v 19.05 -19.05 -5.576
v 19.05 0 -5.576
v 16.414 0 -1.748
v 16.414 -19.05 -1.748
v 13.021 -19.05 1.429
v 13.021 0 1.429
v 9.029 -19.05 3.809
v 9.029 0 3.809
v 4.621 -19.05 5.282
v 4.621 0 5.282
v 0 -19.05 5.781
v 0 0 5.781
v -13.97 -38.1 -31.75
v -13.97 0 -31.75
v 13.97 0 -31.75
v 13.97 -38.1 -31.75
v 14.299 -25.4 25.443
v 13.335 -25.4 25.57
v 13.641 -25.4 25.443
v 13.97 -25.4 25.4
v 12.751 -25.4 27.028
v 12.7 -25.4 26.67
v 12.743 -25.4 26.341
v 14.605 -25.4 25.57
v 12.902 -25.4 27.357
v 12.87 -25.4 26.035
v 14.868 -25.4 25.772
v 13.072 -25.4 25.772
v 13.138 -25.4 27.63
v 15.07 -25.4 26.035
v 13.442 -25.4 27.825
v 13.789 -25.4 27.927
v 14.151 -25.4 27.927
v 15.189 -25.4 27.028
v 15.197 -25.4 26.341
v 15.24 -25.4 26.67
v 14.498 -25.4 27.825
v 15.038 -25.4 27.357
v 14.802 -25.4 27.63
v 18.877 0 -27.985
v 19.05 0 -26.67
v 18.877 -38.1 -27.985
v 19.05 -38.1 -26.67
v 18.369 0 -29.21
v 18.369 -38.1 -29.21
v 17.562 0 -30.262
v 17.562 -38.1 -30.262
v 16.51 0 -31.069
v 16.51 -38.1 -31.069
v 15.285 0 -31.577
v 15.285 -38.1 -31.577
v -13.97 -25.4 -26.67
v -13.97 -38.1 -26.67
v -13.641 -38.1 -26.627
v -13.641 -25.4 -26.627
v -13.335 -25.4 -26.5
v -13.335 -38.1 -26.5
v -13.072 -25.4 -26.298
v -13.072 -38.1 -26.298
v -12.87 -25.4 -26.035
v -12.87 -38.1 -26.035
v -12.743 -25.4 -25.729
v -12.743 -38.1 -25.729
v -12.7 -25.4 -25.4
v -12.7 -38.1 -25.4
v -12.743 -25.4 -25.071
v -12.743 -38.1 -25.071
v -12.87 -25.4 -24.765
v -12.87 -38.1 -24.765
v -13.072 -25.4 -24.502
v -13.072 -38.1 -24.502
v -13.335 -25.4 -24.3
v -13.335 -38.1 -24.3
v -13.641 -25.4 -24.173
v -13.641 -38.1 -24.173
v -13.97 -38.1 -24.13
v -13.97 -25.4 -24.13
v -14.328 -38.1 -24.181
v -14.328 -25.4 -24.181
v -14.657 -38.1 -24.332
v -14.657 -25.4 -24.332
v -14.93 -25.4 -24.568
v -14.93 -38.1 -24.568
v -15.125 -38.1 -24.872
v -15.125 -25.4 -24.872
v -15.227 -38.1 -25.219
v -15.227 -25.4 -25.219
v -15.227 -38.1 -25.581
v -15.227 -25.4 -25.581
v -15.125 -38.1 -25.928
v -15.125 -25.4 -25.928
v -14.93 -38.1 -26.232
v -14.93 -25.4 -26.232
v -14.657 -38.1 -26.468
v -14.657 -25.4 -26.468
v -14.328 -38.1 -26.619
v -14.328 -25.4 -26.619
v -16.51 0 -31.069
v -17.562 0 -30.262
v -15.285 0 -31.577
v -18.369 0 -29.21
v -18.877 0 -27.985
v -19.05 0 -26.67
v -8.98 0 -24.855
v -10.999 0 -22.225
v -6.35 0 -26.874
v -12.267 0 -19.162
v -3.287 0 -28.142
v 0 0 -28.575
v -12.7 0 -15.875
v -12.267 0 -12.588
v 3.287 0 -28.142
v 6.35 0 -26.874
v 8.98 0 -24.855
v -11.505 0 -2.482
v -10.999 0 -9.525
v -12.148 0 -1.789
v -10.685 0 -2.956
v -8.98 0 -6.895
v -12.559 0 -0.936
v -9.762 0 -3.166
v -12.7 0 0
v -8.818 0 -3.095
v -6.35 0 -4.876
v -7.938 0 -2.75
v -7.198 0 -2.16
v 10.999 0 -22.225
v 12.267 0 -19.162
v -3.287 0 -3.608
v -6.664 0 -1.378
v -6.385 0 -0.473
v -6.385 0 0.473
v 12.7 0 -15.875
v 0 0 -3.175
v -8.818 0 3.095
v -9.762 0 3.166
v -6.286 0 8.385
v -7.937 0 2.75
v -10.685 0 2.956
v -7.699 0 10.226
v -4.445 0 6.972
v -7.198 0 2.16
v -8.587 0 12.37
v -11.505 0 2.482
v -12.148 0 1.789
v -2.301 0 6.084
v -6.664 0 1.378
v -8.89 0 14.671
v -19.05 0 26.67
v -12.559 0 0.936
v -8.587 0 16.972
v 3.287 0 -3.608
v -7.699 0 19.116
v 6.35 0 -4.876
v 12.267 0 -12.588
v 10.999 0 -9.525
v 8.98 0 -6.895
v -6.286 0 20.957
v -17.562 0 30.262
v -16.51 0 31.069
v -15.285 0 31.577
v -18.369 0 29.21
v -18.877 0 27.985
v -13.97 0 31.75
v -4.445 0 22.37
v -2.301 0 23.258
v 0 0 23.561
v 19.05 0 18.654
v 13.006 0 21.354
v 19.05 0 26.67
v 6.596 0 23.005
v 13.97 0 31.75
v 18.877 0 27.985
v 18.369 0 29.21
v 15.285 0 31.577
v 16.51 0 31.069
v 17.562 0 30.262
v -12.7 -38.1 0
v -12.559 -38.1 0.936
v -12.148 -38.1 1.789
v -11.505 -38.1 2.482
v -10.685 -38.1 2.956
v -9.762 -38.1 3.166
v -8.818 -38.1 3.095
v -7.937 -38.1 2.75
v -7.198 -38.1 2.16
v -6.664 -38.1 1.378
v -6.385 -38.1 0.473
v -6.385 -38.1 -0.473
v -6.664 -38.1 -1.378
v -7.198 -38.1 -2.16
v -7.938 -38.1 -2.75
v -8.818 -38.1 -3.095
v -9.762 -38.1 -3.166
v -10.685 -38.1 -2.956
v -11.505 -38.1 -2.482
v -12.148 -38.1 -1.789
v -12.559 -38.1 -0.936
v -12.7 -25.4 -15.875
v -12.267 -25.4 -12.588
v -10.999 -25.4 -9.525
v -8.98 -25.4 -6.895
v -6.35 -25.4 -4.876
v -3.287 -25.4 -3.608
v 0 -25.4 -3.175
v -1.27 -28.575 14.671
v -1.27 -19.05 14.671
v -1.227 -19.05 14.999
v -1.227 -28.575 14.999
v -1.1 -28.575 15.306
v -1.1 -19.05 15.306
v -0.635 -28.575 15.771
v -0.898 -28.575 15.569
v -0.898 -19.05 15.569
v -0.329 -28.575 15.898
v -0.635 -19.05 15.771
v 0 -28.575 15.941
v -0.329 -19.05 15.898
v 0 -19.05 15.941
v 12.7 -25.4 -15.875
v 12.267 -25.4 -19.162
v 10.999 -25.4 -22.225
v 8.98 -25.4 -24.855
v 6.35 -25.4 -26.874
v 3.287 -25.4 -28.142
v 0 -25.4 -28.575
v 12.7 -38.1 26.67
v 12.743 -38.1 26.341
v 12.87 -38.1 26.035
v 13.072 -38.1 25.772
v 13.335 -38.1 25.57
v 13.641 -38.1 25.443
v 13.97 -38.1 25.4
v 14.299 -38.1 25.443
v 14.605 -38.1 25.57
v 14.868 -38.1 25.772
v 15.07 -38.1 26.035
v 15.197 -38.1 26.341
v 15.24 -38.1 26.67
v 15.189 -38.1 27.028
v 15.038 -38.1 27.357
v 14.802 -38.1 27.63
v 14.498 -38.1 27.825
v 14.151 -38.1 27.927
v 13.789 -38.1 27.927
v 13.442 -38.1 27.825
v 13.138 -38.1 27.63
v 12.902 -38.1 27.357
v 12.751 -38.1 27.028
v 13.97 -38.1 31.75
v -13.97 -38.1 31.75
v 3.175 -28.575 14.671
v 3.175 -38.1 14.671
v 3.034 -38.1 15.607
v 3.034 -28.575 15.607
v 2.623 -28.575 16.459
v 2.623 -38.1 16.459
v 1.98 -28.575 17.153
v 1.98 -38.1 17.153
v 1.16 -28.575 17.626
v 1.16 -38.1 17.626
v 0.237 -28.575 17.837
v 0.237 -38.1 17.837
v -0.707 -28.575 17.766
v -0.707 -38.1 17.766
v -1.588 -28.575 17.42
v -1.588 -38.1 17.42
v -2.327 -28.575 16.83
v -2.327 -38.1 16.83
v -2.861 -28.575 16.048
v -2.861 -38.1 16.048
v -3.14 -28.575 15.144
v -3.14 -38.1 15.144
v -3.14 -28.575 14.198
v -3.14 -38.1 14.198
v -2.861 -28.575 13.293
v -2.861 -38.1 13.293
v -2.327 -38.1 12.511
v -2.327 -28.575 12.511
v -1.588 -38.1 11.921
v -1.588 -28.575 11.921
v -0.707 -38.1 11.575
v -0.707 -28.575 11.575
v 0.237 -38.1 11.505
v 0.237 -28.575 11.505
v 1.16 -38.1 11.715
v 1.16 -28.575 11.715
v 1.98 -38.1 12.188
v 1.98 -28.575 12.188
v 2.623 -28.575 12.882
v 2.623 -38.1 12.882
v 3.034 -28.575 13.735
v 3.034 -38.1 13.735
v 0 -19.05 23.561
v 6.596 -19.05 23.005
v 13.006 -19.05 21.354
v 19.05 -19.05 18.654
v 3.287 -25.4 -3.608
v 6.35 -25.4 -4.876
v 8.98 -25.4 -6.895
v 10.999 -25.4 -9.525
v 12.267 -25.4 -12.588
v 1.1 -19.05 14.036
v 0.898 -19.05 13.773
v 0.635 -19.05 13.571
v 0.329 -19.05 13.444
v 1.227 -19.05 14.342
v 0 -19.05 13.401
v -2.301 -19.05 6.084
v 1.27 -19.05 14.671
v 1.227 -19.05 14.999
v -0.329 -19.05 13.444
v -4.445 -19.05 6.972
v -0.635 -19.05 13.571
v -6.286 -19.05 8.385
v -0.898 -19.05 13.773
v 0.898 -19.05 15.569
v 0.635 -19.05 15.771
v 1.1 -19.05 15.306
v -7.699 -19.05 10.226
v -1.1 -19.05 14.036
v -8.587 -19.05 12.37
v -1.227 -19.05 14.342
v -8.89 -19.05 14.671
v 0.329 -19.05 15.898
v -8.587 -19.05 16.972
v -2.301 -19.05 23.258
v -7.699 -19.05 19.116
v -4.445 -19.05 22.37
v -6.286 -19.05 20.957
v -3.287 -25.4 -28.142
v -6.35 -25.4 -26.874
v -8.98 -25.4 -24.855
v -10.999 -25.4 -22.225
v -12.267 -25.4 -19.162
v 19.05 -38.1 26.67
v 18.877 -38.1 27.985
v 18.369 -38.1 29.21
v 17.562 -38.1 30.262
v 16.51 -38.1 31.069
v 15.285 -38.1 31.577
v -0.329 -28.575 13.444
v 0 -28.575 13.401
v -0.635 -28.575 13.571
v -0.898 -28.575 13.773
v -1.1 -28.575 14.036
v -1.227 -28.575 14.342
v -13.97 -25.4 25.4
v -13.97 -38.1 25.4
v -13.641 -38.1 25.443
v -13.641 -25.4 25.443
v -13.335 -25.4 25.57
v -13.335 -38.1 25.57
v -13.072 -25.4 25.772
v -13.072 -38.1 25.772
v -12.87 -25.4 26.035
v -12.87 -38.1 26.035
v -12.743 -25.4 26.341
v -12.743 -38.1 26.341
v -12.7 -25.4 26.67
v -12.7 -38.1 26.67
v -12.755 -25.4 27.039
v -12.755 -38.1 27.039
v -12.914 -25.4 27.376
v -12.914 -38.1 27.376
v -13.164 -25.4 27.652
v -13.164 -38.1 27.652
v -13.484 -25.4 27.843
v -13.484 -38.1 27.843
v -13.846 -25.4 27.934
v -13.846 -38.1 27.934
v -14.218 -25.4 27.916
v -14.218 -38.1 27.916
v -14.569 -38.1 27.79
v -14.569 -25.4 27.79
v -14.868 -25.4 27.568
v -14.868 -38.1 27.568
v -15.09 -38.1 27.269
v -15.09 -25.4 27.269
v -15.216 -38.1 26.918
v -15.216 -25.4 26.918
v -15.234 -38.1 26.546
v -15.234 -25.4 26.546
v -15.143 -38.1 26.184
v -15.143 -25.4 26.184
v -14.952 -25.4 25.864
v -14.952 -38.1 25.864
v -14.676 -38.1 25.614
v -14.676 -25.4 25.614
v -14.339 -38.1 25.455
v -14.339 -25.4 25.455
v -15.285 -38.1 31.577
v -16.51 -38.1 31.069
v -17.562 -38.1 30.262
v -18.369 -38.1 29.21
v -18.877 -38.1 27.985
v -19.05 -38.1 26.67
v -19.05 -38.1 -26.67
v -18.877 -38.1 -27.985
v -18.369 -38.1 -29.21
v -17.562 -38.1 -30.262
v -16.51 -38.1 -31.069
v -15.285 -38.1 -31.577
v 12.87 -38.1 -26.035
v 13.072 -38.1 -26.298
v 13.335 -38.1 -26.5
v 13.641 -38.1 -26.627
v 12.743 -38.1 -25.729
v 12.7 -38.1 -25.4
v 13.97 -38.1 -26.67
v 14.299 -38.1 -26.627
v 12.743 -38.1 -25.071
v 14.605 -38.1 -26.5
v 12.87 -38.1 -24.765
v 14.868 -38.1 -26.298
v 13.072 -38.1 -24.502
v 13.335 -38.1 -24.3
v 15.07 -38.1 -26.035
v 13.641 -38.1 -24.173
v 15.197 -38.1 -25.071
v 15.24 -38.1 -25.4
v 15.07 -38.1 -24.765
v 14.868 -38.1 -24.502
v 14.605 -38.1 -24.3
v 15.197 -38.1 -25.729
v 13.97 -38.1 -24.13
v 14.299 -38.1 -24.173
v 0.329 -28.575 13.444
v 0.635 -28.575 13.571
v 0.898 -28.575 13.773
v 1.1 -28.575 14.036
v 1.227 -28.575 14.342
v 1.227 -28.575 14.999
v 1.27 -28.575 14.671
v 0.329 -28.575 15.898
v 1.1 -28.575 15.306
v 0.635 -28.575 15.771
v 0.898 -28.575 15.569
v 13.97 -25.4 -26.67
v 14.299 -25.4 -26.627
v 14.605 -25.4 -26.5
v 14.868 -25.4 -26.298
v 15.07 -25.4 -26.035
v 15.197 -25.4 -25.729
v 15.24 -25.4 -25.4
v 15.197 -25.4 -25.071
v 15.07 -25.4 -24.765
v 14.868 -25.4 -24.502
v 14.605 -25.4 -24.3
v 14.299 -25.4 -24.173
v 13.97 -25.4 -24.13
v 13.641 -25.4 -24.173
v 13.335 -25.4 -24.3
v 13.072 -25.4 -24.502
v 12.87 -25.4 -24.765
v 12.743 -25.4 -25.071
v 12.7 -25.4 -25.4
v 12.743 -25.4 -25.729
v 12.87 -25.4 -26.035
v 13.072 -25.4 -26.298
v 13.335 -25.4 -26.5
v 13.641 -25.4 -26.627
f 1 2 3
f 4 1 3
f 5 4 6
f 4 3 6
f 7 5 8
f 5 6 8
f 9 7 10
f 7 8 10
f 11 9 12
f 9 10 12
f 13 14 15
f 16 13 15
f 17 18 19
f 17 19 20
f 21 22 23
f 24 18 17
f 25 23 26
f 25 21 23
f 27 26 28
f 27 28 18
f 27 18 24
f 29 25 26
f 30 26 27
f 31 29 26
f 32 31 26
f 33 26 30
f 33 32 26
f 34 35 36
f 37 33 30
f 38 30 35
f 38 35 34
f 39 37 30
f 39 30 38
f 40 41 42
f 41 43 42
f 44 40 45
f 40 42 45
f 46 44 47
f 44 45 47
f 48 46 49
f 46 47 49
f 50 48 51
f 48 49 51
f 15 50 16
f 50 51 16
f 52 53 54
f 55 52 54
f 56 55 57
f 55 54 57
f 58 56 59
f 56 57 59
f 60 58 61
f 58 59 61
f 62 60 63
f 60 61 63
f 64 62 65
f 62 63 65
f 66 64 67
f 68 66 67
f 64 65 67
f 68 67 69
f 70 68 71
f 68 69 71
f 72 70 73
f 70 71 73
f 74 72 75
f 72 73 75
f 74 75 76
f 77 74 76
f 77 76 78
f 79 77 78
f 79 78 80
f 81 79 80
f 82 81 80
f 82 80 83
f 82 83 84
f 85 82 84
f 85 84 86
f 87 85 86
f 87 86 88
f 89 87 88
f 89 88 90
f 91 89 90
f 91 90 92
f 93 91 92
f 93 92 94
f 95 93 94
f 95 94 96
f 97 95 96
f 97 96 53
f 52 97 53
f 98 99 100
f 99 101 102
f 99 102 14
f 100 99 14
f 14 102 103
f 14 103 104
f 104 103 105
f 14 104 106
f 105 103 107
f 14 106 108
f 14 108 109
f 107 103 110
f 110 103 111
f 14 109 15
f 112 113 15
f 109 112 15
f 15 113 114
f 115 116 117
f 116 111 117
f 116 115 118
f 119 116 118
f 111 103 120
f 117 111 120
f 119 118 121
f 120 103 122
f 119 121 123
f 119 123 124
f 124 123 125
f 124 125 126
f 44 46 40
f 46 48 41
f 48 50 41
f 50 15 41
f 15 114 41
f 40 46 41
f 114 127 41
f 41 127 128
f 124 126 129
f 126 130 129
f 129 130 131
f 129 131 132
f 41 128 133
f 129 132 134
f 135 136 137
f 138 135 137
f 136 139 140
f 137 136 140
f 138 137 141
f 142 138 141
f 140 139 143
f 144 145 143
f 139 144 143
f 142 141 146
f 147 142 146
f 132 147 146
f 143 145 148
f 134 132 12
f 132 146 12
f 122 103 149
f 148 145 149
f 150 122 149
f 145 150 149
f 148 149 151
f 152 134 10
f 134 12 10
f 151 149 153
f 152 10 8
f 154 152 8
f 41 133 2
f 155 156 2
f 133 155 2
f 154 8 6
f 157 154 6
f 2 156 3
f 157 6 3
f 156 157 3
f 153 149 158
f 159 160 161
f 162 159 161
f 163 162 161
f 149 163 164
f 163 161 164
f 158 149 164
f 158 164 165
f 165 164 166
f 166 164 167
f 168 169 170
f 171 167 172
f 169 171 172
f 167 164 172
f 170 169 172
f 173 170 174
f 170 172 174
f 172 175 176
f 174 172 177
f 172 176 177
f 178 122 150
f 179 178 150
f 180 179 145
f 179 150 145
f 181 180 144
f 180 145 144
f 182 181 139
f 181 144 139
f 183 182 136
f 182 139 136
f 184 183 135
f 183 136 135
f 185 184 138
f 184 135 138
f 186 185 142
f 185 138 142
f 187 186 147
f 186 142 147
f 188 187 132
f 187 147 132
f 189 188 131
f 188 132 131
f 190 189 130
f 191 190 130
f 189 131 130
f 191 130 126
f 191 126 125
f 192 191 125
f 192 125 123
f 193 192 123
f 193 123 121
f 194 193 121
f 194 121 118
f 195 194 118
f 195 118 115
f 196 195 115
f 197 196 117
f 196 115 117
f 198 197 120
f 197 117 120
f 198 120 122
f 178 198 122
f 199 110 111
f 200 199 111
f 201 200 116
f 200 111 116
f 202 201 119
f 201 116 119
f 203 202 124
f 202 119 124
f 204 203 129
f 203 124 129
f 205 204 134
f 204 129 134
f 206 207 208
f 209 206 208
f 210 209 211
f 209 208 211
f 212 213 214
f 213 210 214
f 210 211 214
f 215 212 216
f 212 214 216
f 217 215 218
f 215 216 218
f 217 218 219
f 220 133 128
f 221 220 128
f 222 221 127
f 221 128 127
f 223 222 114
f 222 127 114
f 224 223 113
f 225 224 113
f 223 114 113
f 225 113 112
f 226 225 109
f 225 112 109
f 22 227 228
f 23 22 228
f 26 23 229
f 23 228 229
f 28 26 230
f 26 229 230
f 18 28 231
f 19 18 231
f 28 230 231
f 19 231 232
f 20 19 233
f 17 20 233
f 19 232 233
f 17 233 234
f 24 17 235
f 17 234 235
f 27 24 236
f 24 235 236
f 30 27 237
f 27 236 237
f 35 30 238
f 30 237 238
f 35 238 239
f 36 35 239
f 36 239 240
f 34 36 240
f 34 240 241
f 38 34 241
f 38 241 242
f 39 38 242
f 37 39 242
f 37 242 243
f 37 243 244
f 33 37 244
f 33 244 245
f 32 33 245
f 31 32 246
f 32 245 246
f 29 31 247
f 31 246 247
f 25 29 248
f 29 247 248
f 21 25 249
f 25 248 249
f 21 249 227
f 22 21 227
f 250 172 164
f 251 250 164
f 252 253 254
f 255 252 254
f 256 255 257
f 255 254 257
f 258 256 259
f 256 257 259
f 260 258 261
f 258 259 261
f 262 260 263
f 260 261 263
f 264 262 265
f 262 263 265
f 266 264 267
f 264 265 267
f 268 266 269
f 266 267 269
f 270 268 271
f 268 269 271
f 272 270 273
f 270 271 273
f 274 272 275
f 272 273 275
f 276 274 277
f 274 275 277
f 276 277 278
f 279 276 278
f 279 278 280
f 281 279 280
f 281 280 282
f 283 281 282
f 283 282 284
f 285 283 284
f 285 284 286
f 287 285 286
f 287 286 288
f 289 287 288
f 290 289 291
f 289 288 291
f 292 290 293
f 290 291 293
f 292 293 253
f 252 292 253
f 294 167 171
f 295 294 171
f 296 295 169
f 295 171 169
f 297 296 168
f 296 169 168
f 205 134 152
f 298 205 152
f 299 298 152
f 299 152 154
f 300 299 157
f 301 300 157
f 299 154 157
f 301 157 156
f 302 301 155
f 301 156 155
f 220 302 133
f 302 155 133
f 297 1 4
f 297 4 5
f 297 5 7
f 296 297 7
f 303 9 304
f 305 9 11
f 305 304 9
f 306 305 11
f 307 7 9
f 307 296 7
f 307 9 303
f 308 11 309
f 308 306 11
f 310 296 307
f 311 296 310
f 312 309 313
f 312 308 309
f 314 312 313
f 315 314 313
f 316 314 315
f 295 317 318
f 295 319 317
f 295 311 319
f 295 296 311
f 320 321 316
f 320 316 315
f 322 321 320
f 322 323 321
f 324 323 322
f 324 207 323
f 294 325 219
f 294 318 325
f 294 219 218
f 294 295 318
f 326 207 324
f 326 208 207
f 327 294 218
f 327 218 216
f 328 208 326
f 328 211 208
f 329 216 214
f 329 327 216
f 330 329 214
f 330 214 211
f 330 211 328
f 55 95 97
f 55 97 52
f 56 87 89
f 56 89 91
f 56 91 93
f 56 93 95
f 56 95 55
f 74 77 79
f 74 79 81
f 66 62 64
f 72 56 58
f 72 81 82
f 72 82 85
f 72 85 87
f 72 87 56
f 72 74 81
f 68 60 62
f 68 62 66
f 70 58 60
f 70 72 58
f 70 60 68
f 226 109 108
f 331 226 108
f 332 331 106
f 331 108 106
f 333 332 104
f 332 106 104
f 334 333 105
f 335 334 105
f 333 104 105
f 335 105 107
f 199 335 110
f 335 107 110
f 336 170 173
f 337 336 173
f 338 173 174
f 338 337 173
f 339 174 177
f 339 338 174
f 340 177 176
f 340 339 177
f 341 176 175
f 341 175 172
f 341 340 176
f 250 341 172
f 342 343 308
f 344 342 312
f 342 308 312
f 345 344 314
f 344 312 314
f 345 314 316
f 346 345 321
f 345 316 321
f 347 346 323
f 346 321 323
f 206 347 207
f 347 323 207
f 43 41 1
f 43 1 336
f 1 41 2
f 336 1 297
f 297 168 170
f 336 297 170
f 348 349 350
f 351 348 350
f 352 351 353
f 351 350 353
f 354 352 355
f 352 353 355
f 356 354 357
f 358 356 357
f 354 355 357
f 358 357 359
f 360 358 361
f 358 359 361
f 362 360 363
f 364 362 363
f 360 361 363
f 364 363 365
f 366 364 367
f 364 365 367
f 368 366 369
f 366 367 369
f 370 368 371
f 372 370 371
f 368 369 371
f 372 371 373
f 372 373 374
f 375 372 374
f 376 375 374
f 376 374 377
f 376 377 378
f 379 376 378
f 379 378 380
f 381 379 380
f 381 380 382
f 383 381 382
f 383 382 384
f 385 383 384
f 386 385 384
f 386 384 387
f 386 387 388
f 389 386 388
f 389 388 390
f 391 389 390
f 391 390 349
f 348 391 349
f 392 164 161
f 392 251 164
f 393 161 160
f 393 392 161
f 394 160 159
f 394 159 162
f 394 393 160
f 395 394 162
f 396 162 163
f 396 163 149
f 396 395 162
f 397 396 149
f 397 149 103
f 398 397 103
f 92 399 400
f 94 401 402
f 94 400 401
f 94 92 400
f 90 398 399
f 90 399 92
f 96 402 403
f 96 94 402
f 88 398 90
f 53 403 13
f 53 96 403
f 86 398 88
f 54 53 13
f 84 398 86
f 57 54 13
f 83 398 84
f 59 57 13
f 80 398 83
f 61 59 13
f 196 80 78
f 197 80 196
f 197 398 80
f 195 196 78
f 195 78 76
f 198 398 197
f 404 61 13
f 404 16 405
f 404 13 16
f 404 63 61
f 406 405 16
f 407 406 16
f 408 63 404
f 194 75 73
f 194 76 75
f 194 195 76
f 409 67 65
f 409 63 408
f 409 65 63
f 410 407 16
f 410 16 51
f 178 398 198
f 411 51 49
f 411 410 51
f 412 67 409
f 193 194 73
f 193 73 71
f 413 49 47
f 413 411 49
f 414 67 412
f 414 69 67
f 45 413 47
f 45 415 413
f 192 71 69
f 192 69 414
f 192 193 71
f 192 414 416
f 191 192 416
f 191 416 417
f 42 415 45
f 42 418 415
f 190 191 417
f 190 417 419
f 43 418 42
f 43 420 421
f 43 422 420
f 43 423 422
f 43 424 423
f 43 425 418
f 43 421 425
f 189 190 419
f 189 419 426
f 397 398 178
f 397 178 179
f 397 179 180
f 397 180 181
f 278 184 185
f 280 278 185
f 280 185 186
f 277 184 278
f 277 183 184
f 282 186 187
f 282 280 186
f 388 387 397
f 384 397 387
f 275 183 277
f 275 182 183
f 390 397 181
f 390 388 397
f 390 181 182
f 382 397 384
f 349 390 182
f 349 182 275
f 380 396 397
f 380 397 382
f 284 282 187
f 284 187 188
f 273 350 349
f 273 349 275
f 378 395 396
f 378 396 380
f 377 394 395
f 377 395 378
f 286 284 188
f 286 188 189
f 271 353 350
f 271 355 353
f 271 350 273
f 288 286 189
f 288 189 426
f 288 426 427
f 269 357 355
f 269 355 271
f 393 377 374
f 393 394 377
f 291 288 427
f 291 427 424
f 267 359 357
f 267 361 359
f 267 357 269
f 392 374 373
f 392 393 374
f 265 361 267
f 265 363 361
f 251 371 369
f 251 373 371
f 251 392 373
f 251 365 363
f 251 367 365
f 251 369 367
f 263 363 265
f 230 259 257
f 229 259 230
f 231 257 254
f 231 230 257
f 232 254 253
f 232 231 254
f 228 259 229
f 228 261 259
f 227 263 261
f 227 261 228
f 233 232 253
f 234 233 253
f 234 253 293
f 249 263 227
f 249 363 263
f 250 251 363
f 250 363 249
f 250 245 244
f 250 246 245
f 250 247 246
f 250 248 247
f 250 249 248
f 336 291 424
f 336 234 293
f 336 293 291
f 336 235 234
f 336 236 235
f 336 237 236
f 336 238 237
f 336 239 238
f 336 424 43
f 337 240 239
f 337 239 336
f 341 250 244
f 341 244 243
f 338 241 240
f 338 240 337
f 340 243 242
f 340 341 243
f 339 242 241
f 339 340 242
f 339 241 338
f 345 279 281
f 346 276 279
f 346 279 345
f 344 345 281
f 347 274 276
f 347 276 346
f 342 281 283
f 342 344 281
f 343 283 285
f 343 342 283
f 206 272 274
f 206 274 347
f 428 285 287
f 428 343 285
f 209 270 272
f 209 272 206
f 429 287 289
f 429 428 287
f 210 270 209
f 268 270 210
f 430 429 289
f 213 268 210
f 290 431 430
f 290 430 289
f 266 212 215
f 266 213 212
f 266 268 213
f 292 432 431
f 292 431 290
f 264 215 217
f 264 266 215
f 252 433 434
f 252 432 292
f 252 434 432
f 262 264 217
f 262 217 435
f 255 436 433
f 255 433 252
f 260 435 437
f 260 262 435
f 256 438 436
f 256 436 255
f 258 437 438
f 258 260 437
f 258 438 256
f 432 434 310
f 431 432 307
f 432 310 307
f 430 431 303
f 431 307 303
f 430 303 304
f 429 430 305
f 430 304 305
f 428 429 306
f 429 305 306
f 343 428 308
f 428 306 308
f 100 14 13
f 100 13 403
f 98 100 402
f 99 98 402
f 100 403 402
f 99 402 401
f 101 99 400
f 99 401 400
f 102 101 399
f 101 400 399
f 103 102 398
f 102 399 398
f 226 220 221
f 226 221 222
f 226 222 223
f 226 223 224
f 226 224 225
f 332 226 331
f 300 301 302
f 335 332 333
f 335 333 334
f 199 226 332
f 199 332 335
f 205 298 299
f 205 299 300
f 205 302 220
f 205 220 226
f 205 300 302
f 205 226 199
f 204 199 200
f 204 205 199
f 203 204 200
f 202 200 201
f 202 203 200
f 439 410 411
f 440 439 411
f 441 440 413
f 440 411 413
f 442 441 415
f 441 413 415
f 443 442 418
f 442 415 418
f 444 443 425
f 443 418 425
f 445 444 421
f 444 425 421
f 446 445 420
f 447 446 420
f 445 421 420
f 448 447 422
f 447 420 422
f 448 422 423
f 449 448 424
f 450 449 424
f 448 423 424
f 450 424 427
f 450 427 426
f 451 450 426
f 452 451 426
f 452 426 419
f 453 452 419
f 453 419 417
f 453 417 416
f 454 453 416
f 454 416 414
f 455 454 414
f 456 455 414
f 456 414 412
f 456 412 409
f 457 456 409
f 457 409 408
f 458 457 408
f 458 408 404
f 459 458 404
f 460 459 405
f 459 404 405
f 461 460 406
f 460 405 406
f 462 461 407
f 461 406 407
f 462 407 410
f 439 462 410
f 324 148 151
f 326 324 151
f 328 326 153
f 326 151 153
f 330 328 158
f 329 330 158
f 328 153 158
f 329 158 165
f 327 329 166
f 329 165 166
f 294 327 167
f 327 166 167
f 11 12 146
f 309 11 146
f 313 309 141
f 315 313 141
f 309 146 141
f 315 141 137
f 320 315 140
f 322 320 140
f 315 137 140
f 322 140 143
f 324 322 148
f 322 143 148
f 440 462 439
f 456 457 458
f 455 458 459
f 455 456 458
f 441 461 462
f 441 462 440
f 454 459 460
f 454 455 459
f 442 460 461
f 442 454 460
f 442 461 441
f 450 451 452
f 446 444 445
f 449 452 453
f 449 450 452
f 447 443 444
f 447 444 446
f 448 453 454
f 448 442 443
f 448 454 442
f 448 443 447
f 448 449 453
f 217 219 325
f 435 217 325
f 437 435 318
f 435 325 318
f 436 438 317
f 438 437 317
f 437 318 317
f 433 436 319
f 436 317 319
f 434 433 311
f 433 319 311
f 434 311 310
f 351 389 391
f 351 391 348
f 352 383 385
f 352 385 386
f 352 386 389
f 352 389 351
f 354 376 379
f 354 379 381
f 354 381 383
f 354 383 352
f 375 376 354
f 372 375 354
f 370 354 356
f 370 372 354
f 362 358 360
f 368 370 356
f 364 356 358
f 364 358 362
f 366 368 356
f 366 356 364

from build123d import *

# Parameters (mm, degrees)
F1_DEPTH = 38.1
F3_DEPTH = 19.05
F4_DEPTH = 38.1
F5_DEPTH = 25.4
F6_R     = 5.08
F7_R     = 3.175
F7_R_2   = 1.27
F8_DEPTH = 9.525
F9_DEPTH = 12.7
F10_R    = 5.08


# Not quite as in the source:
# - a feature names something its author has since deleted; it is built from what else it names


with BuildPart() as f1:
    # F0 (on Front) → F1 (new body)
    with BuildSketch(Plane.XZ):
        Polygon((19.05, -31.75), (19.05, 31.75), (-19.05, 31.75), (-19.05, 0), (-19.05, -31.75), align=None)
        with BuildLine():
            ThreePointArc((-6.35, 0), (-9.525, -3.175), (-12.7, 0))
            ThreePointArc((-12.7, 0), (-9.525, 3.175), (-6.35, 0))
        make_face(mode=Mode.SUBTRACT)
    extrude(amount=F1_DEPTH)

    # F2 (on face) → F3 (cut)
    with BuildSketch(Plane(origin=(0, 0, 0), x_dir=(-1, 0, 0), z_dir=(0, 1, 0))):
        with BuildLine():
            ThreePointArc((-8.89, 14.6707808959), (-6.2861792775, 20.956960188), (2.06e-08, 23.5607808959))
            ThreePointArc((2.06e-08, 23.5607808959), (-9.8358430758, 22.3144881592), (-19.05, 18.654383355))
            Line((-19.05, 18.654383355), (-19.05, 14.6707808959))
            Line((-19.05, 14.6707808959), (-8.89, 14.6707808959))
        make_face()
        with BuildLine():
            ThreePointArc((1.27, 14.6707808959), (0.8980256121, 15.5688065081), (0, 15.9407808959))
            Line((0, 15.9407808959), (0, 14.6707808959))
            Line((0, 14.6707808959), (1.27, 14.6707808959))
        make_face()
        with BuildLine():
            ThreePointArc((0, 13.4007808959), (0.8980256121, 13.7727552838), (1.27, 14.6707808959))
            Line((1.27, 14.6707808959), (0, 14.6707808959))
            Line((0, 14.6707808959), (0, 13.4007808959))
        make_face()
        with BuildLine():
            Line((0, 14.6707808959), (0, 15.9407808959))
            ThreePointArc((0, 15.9407808959), (-0.8980256121, 15.5688065081), (-1.27, 14.6707808959))
            Line((-1.27, 14.6707808959), (0, 14.6707808959))
        make_face()
        with BuildLine():
            Line((0, 14.6707808959), (-1.27, 14.6707808959))
            ThreePointArc((-1.27, 14.6707808959), (-0.8980256121, 13.7727552838), (0, 13.4007808959))
            Line((0, 13.4007808959), (0, 14.6707808959))
        make_face()
        with BuildLine():
            ThreePointArc((-1.6e-09, 5.7807808959), (-6.2861792853, 8.3846016118), (-8.89, 14.6707808959))
            Line((-8.89, 14.6707808959), (-19.05, 14.6707808959))
            Line((-19.05, 14.6707808959), (-19.05, -5.5759541115))
            ThreePointArc((-19.05, -5.5759541115), (-11.0891605869, 2.7261656541), (-1.6e-09, 5.7807808959))
        make_face()
        with BuildLine():
            Line((-1.27, 14.6707808959), (-8.89, 14.6707808959))
            ThreePointArc((-8.89, 14.6707808959), (-6.2861792853, 8.3846016118), (-1.6e-09, 5.7807808959))
            Line((0, 5.7807808959), (0, 6.7332808959))
            Line((0, 6.7332808959), (0, 13.4007808959))
            ThreePointArc((0, 13.4007808959), (-0.8980256121, 13.7727552838), (-1.27, 14.6707808959))
        make_face()
        with BuildLine():
            ThreePointArc((-1.6e-09, 5.7807808959), (6.2861792842, 8.3846016106), (8.89, 14.6707808959))
            Line((8.89, 14.6707808959), (1.27, 14.6707808959))
            ThreePointArc((1.27, 14.6707808959), (0.8980256121, 13.7727552838), (0, 13.4007808959))
            Line((0, 13.4007808959), (0, 6.7332808959))
            Line((0, 6.7332808959), (0, 5.7807808959))
        make_face()
        with BuildLine():
            ThreePointArc((8.89, 14.6707808959), (6.286179292, 20.9569601734), (2.06e-08, 23.5607808959))
            Line((0, 23.5607808959), (0, 22.6082808959))
            Line((0, 22.6082808959), (0, 15.9407808959))
            ThreePointArc((0, 15.9407808959), (0.8980256121, 15.5688065081), (1.27, 14.6707808959))
            Line((1.27, 14.6707808959), (8.89, 14.6707808959))
        make_face()
        with BuildLine():
            Line((0, 22.6082808959), (0, 23.5607808959))
            ThreePointArc((2.06e-08, 23.5607808959), (-6.2861792775, 20.956960188), (-8.89, 14.6707808959))
            Line((-8.89, 14.6707808959), (-1.27, 14.6707808959))
            ThreePointArc((-1.27, 14.6707808959), (-0.8980256121, 15.5688065081), (0, 15.9407808959))
            Line((0, 15.9407808959), (0, 22.6082808959))
        make_face()
    extrude(amount=-F3_DEPTH, mode=Mode.SUBTRACT)

    # F2 (on face) → F4 (cut)
    with BuildSketch(Plane(origin=(0, 0, 0), x_dir=(-1, 0, 0), z_dir=(0, 1, 0))):
        with BuildLine():
            Line((0, 14.6707808959), (0, 15.9407808959))
            ThreePointArc((0, 15.9407808959), (-0.8980256121, 15.5688065081), (-1.27, 14.6707808959))
            Line((-1.27, 14.6707808959), (0, 14.6707808959))
        make_face()
        with BuildLine():
            ThreePointArc((1.27, 14.6707808959), (0.8980256121, 15.5688065081), (0, 15.9407808959))
            Line((0, 15.9407808959), (0, 14.6707808959))
            Line((0, 14.6707808959), (1.27, 14.6707808959))
        make_face()
        with BuildLine():
            ThreePointArc((0, 13.4007808959), (0.8980256121, 13.7727552838), (1.27, 14.6707808959))
            Line((1.27, 14.6707808959), (0, 14.6707808959))
            Line((0, 14.6707808959), (0, 13.4007808959))
        make_face()
        with BuildLine():
            Line((0, 14.6707808959), (-1.27, 14.6707808959))
            ThreePointArc((-1.27, 14.6707808959), (-0.8980256121, 13.7727552838), (0, 13.4007808959))
            Line((0, 13.4007808959), (0, 14.6707808959))
        make_face()
    extrude(amount=-F4_DEPTH, mode=Mode.SUBTRACT)

    # F2 (on face) → F5 (cut)
    with BuildSketch(Plane(origin=(0, 0, 0), x_dir=(-1, 0, 0), z_dir=(0, 1, 0))):
        with BuildLine():
            ThreePointArc((12.7, -15.875), (8.9802561211, -6.8947438789), (0, -3.175))
            ThreePointArc((0, -3.175), (-8.9802561211, -6.8947438789), (-12.7, -15.875))
            ThreePointArc((-12.7, -15.875), (-8.9802561211, -24.8552561211), (0, -28.575))
            ThreePointArc((0, -28.575), (8.9802561211, -24.8552561211), (12.7, -15.875))
        make_face()
    extrude(amount=-F5_DEPTH, mode=Mode.SUBTRACT)

    # F6
    f6_edges = [f1.edges().sort_by_distance(p)[0] for p in [
        (19.05, -19.05, 31.75),
        (-19.05, -19.05, 31.75),
    ]]
    fillet(f6_edges, radius=F6_R)

    # F7 (on face) → F8 (cut)
    with BuildSketch(Plane.XZ.offset(38.1)):
        with BuildLine():
            Line((-13.97, 25.4), (-13.97, 26.67))
            Line((-13.97, 26.67), (-12.7, 26.67))
            ThreePointArc((-12.7, 26.67), (-14.8680256121, 27.5680256121), (-13.97, 25.4))
        make_face()
        with BuildLine():
            Line((-12.7, 26.67), (-13.97, 26.67))
            Line((-13.97, 26.67), (-13.97, 25.4))
            ThreePointArc((-13.97, 25.4), (-13.0719743879, 25.7719743879), (-12.7, 26.67))
        make_face()
        with BuildLine():
            Line((13.97, 26.67), (12.7, 26.67))
            ThreePointArc((12.7, 26.67), (13.0719743879, 25.7719743879), (13.97, 25.4))
            Line((13.97, 25.4), (13.97, 26.67))
        make_face()
        with BuildLine():
            ThreePointArc((15.24, 26.67), (13.97, 27.94), (12.7, 26.67))
            Line((12.7, 26.67), (13.97, 26.67))
            Line((13.97, 26.67), (13.97, 25.4))
            ThreePointArc((13.97, 25.4), (14.8680256121, 25.7719743879), (15.24, 26.67))
        make_face()
        with BuildLine():
            Line((-13.97, -25.4), (-13.97, -24.13))
            ThreePointArc((-13.97, -24.13), (-15.24, -25.4), (-13.97, -26.67))
            Line((-13.97, -26.67), (-13.97, -25.4))
        make_face()
        with BuildLine():
            ThreePointArc((-12.7, -25.4), (-13.0719743879, -24.5019743879), (-13.97, -24.13))
            Line((-13.97, -24.13), (-13.97, -25.4))
            Line((-13.97, -25.4), (-12.7, -25.4))
        make_face()
        with BuildLine():
            ThreePointArc((15.24, -25.4), (14.8680256121, -24.5019743879), (13.97, -24.13))
            Line((13.97, -24.13), (13.97, -25.4))
            Line((13.97, -25.4), (13.97, -26.67))
            ThreePointArc((13.97, -26.67), (14.8680256121, -26.2980256121), (15.24, -25.4))
        make_face()
        with BuildLine():
            Line((13.97, -25.4), (13.97, -24.13))
            ThreePointArc((13.97, -24.13), (13.0719743879, -24.5019743879), (12.7, -25.4))
            Line((12.7, -25.4), (13.97, -25.4))
        make_face()
        with BuildLine():
            Line((13.97, -25.4), (12.7, -25.4))
            ThreePointArc((12.7, -25.4), (13.0719743879, -26.2980256121), (13.97, -26.67))
            Line((13.97, -26.67), (13.97, -25.4))
        make_face()
        with BuildLine():
            Line((-12.7, -25.4), (-13.97, -25.4))
            Line((-13.97, -25.4), (-13.97, -26.67))
            ThreePointArc((-13.97, -26.67), (-13.0719743879, -26.2980256121), (-12.7, -25.4))
        make_face()
        with Locations((0, 14.6707808959)):
            Circle(F7_R)
        with Locations((0, 14.6707808959)):
            Circle(F7_R_2, mode=Mode.SUBTRACT)
    extrude(amount=-F8_DEPTH, mode=Mode.SUBTRACT)

    # F7 (on face) → F9 (cut)
    with BuildSketch(Plane.XZ.offset(38.1)):
        with BuildLine():
            Line((-12.7, 26.67), (-13.97, 26.67))
            Line((-13.97, 26.67), (-13.97, 25.4))
            ThreePointArc((-13.97, 25.4), (-13.0719743879, 25.7719743879), (-12.7, 26.67))
        make_face()
        with BuildLine():
            Line((-13.97, 25.4), (-13.97, 26.67))
            Line((-13.97, 26.67), (-12.7, 26.67))
            ThreePointArc((-12.7, 26.67), (-14.8680256121, 27.5680256121), (-13.97, 25.4))
        make_face()
        with BuildLine():
            Line((13.97, 26.67), (12.7, 26.67))
            ThreePointArc((12.7, 26.67), (13.0719743879, 25.7719743879), (13.97, 25.4))
            Line((13.97, 25.4), (13.97, 26.67))
        make_face()
        with BuildLine():
            ThreePointArc((15.24, 26.67), (13.97, 27.94), (12.7, 26.67))
            Line((12.7, 26.67), (13.97, 26.67))
            Line((13.97, 26.67), (13.97, 25.4))
            ThreePointArc((13.97, 25.4), (14.8680256121, 25.7719743879), (15.24, 26.67))
        make_face()
        with BuildLine():
            ThreePointArc((15.24, -25.4), (14.8680256121, -24.5019743879), (13.97, -24.13))
            Line((13.97, -24.13), (13.97, -25.4))
            Line((13.97, -25.4), (13.97, -26.67))
            ThreePointArc((13.97, -26.67), (14.8680256121, -26.2980256121), (15.24, -25.4))
        make_face()
        with BuildLine():
            Line((13.97, -25.4), (13.97, -24.13))
            ThreePointArc((13.97, -24.13), (13.0719743879, -24.5019743879), (12.7, -25.4))
            Line((12.7, -25.4), (13.97, -25.4))
        make_face()
        with BuildLine():
            Line((13.97, -25.4), (12.7, -25.4))
            ThreePointArc((12.7, -25.4), (13.0719743879, -26.2980256121), (13.97, -26.67))
            Line((13.97, -26.67), (13.97, -25.4))
        make_face()
        with BuildLine():
            Line((-12.7, -25.4), (-13.97, -25.4))
            Line((-13.97, -25.4), (-13.97, -26.67))
            ThreePointArc((-13.97, -26.67), (-13.0719743879, -26.2980256121), (-12.7, -25.4))
        make_face()
        with BuildLine():
            ThreePointArc((-12.7, -25.4), (-13.0719743879, -24.5019743879), (-13.97, -24.13))
            Line((-13.97, -24.13), (-13.97, -25.4))
            Line((-13.97, -25.4), (-12.7, -25.4))
        make_face()
        with BuildLine():
            Line((-13.97, -25.4), (-13.97, -24.13))
            ThreePointArc((-13.97, -24.13), (-15.24, -25.4), (-13.97, -26.67))
            Line((-13.97, -26.67), (-13.97, -25.4))
        make_face()
    extrude(amount=-F9_DEPTH, mode=Mode.SUBTRACT)

    # F10
    f10_edges = [f1.edges().sort_by_distance(p)[0] for p in [
        (19.05, -19.05, -31.75),
        (-19.05, -19.05, -31.75),
    ]]
    fillet(f10_edges, radius=F10_R)


solid = f1.part
